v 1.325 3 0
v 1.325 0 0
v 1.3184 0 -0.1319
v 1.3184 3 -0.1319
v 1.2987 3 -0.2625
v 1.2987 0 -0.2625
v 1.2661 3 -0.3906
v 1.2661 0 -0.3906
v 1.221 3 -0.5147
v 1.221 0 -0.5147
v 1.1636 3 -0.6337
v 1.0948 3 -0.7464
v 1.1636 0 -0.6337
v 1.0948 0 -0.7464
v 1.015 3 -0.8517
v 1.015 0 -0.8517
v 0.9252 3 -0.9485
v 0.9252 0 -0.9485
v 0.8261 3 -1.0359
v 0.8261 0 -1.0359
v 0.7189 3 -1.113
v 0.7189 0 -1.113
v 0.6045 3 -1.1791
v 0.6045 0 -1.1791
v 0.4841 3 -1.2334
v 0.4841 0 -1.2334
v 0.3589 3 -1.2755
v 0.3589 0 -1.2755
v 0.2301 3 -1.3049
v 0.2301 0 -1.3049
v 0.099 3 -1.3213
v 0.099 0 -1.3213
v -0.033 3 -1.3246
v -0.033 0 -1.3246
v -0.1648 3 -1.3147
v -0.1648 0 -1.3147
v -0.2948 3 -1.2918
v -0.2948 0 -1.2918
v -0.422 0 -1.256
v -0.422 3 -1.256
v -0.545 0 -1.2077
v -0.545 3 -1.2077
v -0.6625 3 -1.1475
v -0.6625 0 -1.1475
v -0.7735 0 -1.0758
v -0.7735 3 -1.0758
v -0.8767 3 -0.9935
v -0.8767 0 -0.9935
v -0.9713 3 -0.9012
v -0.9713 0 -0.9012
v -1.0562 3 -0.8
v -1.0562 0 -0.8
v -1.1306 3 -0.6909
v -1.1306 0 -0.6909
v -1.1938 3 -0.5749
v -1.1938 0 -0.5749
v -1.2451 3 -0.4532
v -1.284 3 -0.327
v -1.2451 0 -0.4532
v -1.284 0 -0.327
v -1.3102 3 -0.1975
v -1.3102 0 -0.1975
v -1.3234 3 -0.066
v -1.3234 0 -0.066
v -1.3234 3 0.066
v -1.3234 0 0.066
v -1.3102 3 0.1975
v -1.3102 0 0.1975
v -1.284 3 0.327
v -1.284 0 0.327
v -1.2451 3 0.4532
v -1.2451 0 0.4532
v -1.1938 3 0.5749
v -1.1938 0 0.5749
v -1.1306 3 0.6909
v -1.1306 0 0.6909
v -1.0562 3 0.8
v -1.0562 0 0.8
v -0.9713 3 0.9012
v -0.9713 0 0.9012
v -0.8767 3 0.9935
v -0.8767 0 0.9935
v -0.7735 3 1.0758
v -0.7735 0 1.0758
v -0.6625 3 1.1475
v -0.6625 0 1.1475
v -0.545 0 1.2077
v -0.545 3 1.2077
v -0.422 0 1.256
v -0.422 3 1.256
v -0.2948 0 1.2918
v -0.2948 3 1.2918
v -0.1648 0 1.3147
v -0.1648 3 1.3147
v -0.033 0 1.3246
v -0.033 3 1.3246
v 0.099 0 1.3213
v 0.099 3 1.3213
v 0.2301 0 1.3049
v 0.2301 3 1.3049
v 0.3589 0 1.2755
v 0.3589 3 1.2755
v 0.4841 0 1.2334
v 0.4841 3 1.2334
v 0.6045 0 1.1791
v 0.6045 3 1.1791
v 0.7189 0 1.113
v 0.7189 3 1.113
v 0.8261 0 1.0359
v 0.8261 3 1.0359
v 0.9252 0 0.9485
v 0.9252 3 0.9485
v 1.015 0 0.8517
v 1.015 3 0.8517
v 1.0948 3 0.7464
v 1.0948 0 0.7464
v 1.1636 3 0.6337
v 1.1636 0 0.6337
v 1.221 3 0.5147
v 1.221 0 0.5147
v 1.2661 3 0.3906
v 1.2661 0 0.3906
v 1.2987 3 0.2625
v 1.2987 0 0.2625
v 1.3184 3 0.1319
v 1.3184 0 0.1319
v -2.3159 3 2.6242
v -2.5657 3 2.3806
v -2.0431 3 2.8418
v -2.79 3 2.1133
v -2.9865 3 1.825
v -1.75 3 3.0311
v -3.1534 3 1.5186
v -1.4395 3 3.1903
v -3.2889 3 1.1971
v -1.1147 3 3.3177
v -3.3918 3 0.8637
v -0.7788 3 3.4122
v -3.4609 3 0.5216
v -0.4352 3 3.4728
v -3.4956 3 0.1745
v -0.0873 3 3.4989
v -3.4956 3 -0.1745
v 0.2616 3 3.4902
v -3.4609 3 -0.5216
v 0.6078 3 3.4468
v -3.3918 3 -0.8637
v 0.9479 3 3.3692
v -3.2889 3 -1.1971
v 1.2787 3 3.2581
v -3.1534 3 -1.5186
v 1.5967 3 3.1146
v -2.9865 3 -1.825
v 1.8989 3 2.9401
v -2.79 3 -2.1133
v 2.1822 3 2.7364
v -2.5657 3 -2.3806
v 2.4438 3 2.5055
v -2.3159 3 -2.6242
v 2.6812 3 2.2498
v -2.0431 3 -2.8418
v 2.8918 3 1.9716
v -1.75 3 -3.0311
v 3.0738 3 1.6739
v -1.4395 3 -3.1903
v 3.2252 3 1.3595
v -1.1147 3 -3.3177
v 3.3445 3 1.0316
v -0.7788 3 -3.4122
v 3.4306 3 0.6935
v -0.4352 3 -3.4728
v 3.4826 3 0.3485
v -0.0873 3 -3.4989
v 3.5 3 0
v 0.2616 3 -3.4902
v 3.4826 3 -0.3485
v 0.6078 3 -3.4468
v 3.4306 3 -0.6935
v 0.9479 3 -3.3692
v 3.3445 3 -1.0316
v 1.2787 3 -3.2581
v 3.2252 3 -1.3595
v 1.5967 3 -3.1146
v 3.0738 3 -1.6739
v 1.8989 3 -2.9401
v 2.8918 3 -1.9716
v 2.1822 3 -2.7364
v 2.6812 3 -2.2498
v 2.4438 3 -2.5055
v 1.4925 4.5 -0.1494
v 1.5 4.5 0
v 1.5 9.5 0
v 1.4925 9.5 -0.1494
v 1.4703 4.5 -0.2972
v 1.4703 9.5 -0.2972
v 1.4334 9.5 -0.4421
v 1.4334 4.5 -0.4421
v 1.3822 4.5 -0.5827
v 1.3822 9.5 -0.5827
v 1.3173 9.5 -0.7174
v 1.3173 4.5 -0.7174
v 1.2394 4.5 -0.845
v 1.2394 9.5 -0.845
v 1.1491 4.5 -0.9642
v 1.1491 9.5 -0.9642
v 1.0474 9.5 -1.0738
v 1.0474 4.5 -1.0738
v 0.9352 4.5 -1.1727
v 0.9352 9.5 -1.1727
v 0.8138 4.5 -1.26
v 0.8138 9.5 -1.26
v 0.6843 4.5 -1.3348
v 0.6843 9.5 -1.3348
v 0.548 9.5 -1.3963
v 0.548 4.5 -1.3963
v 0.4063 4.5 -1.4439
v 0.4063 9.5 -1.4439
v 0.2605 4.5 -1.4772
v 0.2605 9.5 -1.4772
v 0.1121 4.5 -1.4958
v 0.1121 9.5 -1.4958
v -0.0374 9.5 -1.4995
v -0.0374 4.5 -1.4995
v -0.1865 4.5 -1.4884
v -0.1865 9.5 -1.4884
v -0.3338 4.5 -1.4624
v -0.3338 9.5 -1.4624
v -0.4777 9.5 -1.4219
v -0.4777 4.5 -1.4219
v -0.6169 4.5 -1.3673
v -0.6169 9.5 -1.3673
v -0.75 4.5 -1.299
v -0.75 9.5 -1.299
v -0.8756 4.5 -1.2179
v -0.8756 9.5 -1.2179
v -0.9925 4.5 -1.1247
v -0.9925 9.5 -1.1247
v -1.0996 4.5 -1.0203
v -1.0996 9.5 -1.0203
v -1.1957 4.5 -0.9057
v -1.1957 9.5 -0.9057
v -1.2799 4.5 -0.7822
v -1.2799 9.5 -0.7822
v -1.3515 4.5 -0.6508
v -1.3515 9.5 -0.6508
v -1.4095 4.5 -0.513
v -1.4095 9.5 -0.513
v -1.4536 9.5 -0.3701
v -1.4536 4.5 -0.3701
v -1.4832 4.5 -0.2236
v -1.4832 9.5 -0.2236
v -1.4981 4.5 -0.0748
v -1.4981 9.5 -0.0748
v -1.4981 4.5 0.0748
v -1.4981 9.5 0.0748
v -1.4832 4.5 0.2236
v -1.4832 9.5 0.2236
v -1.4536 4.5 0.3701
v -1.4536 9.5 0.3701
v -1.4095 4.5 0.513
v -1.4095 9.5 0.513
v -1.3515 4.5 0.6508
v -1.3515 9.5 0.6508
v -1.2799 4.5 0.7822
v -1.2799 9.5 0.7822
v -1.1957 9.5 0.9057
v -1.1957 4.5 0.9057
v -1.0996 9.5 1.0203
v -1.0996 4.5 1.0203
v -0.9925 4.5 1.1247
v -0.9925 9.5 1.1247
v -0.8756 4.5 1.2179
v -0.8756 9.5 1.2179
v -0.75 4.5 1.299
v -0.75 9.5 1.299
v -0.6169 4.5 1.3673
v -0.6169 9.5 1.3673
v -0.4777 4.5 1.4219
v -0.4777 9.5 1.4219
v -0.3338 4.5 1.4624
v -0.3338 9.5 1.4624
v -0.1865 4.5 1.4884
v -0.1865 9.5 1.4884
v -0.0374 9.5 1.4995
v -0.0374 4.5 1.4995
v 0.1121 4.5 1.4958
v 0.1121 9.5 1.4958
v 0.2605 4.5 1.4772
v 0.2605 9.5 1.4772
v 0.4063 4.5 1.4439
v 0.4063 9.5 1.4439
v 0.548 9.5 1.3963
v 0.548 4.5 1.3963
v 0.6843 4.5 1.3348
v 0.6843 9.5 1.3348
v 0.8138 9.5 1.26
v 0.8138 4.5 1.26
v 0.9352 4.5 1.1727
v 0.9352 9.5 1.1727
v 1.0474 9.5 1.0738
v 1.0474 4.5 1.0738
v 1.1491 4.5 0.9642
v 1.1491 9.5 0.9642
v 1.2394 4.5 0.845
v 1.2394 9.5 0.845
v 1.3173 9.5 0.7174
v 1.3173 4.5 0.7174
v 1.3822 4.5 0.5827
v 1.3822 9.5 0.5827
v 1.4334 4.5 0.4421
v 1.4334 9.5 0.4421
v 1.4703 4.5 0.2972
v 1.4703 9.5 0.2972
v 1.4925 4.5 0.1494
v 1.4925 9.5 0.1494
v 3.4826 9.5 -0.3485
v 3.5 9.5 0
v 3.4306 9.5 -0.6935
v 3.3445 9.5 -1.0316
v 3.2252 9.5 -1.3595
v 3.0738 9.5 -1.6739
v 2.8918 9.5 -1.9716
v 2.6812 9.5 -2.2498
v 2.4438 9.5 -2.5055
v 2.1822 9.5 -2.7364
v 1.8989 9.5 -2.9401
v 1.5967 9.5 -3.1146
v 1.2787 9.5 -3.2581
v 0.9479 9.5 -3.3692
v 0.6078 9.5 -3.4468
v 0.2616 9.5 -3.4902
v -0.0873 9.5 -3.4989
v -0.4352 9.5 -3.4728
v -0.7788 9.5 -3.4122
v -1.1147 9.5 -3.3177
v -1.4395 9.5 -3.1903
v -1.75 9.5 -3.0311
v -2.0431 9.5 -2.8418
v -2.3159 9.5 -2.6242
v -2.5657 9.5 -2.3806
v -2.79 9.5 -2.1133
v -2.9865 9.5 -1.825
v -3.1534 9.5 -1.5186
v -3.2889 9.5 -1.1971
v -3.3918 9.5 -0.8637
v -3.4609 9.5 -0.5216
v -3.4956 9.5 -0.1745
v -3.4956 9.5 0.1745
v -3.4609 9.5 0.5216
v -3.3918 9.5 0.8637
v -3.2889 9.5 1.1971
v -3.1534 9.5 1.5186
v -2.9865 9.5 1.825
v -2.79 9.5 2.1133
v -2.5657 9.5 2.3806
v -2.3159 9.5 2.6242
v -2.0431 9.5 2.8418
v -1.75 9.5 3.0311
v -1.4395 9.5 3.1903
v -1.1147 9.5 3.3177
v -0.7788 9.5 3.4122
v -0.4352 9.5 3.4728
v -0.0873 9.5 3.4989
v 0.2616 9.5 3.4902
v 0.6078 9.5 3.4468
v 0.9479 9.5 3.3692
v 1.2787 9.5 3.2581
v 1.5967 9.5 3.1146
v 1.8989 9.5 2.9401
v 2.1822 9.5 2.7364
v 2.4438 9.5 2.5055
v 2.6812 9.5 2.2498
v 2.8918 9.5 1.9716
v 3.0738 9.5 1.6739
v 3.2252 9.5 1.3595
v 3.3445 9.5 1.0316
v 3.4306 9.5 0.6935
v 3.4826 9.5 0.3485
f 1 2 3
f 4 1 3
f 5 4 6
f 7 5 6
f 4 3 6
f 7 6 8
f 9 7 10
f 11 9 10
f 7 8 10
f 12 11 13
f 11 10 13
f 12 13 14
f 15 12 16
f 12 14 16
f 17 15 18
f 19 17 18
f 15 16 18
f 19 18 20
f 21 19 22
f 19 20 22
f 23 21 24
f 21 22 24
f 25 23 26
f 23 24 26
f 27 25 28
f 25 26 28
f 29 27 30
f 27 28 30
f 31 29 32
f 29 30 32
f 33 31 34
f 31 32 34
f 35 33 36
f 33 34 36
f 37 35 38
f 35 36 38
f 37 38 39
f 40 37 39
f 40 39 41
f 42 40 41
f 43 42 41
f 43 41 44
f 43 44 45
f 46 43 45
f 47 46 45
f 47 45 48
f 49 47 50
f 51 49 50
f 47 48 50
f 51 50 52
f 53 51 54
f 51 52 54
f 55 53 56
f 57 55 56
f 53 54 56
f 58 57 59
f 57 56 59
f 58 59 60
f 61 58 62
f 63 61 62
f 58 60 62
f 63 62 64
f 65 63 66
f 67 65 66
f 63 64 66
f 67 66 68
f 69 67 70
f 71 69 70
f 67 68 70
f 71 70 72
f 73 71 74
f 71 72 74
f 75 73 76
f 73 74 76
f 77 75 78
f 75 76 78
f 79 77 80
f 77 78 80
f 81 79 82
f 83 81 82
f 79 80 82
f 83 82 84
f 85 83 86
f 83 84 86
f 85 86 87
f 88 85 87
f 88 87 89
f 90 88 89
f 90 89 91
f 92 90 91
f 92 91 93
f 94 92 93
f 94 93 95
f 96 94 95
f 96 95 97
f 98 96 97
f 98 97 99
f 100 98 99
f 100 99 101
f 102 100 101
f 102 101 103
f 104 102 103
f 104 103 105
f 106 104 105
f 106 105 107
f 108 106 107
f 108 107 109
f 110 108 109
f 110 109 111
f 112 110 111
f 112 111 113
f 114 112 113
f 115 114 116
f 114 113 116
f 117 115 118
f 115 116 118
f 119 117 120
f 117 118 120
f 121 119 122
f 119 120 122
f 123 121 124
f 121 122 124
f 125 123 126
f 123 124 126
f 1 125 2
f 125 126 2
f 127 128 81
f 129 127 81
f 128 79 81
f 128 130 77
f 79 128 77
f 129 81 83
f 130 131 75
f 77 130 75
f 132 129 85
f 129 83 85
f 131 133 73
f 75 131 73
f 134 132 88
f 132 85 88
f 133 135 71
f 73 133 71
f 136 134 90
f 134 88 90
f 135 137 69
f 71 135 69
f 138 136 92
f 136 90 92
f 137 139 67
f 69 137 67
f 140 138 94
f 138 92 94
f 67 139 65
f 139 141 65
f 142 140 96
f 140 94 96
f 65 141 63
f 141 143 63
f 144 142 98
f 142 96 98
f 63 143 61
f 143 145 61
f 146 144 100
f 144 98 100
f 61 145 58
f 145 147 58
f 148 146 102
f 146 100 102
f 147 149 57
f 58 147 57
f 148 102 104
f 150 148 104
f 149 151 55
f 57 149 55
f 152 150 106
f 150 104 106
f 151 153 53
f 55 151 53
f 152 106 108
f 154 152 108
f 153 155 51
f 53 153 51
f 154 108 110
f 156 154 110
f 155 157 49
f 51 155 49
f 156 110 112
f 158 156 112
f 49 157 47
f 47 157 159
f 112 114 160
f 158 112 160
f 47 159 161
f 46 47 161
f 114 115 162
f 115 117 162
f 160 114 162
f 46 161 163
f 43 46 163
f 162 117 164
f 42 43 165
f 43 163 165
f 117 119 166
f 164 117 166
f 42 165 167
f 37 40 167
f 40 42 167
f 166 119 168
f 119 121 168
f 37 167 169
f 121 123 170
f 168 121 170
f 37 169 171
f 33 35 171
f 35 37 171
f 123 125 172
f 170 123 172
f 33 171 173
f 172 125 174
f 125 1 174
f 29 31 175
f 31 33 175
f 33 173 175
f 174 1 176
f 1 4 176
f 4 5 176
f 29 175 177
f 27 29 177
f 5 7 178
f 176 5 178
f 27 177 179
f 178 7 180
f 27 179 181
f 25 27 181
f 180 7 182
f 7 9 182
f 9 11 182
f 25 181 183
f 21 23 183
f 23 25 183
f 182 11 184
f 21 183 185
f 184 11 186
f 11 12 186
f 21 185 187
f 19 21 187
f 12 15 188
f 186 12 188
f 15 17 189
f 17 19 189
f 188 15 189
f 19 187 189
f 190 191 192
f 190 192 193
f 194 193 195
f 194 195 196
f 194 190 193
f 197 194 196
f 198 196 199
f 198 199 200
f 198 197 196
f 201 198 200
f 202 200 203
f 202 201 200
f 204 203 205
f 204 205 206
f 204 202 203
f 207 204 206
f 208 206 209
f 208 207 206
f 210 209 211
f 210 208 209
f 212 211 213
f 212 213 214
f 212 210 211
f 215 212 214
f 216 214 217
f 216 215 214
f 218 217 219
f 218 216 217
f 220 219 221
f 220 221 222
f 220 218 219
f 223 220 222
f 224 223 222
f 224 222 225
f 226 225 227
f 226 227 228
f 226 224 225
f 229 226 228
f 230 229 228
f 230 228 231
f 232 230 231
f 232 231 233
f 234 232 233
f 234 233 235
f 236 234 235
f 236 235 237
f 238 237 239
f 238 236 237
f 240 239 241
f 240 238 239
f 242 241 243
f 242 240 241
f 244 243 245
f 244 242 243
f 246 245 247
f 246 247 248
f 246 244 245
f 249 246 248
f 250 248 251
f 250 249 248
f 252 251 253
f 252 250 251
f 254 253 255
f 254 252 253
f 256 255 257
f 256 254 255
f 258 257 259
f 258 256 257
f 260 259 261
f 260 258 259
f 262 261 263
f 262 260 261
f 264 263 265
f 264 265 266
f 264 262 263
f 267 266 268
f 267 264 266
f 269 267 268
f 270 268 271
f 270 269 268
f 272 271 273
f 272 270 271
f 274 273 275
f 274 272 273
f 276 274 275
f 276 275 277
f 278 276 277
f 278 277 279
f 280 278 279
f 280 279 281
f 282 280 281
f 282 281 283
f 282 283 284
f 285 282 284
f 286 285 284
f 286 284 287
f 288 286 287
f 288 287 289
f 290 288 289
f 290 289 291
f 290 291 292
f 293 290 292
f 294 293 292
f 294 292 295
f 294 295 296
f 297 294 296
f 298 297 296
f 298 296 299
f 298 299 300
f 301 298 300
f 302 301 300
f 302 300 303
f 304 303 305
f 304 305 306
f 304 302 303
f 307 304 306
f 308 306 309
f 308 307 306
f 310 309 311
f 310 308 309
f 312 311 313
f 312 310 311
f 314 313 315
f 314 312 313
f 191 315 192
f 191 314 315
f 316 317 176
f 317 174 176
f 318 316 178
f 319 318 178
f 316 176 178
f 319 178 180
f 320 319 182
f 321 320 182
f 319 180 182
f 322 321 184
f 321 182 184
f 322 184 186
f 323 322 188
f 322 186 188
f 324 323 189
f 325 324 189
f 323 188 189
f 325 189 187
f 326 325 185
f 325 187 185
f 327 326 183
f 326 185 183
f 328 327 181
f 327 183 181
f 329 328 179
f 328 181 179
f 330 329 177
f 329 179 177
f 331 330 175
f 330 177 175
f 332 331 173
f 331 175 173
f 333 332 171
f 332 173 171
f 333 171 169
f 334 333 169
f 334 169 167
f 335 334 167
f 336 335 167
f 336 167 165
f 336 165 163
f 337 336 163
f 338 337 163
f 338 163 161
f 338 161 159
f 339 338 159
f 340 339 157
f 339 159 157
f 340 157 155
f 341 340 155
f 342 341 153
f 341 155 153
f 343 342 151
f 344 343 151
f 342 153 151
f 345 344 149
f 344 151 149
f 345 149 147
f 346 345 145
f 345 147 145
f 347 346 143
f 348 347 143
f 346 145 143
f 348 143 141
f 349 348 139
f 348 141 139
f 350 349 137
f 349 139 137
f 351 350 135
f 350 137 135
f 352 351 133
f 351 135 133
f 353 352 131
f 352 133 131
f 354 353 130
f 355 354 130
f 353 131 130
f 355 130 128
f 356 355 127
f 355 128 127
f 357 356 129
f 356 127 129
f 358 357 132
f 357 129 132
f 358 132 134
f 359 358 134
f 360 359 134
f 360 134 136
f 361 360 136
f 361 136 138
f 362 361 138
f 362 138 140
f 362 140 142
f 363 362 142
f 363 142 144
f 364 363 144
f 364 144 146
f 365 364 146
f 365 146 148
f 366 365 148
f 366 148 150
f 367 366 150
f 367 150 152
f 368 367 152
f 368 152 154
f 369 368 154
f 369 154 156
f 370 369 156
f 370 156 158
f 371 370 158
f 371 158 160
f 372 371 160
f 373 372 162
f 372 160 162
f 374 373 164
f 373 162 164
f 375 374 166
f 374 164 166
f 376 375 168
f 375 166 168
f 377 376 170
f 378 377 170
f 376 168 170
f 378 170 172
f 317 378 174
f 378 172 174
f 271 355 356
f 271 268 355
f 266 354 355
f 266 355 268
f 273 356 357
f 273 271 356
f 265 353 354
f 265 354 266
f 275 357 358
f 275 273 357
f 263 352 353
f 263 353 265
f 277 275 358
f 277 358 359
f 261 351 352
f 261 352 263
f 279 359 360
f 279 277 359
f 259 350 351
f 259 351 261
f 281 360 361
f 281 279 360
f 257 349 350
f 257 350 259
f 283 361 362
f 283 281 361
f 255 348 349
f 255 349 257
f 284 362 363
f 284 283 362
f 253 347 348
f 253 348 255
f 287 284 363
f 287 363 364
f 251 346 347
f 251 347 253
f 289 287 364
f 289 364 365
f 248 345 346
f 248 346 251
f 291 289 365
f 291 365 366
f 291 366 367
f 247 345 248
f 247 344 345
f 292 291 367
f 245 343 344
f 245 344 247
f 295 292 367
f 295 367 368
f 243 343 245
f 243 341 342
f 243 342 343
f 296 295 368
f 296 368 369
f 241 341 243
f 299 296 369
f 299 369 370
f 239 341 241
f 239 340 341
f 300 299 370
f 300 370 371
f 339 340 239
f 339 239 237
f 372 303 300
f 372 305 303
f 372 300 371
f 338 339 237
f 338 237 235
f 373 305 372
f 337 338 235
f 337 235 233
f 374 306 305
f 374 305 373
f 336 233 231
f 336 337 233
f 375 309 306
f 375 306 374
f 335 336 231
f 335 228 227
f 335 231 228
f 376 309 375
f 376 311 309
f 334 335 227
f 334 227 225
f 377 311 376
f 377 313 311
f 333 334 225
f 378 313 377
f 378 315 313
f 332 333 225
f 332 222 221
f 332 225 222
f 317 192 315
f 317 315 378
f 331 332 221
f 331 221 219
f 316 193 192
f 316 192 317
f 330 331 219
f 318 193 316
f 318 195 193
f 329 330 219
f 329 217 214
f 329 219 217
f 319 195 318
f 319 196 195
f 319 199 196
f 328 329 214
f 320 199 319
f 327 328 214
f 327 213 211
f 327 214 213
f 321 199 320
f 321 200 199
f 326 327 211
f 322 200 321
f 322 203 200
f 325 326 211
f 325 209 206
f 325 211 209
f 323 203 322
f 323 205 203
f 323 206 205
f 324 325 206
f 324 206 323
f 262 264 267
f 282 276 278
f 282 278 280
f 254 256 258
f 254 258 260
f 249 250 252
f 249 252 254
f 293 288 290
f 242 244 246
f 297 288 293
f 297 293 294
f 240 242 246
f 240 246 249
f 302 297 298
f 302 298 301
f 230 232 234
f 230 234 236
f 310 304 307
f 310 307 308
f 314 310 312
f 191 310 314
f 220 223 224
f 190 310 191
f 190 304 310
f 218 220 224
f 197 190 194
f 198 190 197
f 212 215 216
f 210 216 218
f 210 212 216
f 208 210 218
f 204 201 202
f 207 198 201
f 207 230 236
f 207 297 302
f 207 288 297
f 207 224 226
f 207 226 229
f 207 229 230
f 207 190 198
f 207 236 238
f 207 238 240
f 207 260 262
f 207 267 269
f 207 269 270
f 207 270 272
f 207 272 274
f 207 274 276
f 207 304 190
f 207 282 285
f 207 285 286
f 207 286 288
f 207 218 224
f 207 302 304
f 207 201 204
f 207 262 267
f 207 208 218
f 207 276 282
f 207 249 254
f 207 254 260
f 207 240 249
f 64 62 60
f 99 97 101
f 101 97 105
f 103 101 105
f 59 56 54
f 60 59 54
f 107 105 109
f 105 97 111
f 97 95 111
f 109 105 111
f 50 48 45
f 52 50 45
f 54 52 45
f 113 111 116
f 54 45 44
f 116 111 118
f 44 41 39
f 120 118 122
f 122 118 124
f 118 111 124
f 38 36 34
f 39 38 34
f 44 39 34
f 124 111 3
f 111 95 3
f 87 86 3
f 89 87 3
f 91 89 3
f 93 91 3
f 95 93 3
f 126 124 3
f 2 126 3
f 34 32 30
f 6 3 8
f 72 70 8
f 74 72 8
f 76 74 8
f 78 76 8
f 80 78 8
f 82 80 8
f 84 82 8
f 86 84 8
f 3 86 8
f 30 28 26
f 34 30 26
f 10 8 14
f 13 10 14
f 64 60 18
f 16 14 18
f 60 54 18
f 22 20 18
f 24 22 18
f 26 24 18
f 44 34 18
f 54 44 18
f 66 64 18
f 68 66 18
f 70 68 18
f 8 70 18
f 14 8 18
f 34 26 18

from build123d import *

# Parameters (mm, degrees)
SKETCH1_R           = 1.325
BOSS_EXTRUDE1_DEPTH = 3
SKETCH2_R           = 3.5
BOSS_EXTRUDE2_DEPTH = 1.5
SKETCH3_R           = 3.5
SKETCH3_R_2         = 1.5
BOSS_EXTRUDE3_DEPTH = 5


with BuildPart() as part:
    # Sketch1 → Boss-Extrude1 (new body)
    with BuildSketch(Plane(origin=(0, 0, 0), x_dir=(1, 0, 0), z_dir=(0, 1, 0))):
        Circle(SKETCH1_R)
    extrude(amount=BOSS_EXTRUDE1_DEPTH)

    # Sketch2 → Boss-Extrude2 (add)
    with BuildSketch(Plane(origin=(0, 3, 0), x_dir=(1, 0, 0), z_dir=(0, 1, 0))):
        Circle(SKETCH2_R)
    extrude(amount=BOSS_EXTRUDE2_DEPTH)

    # Sketch3 → Boss-Extrude3 (add)
    with BuildSketch(Plane(origin=(0, 4.5, 0), x_dir=(1, 0, 0), z_dir=(0, 1, 0))):
        Circle(SKETCH3_R)
        Circle(SKETCH3_R_2, mode=Mode.SUBTRACT)
    extrude(amount=BOSS_EXTRUDE3_DEPTH)


solid = part.part
